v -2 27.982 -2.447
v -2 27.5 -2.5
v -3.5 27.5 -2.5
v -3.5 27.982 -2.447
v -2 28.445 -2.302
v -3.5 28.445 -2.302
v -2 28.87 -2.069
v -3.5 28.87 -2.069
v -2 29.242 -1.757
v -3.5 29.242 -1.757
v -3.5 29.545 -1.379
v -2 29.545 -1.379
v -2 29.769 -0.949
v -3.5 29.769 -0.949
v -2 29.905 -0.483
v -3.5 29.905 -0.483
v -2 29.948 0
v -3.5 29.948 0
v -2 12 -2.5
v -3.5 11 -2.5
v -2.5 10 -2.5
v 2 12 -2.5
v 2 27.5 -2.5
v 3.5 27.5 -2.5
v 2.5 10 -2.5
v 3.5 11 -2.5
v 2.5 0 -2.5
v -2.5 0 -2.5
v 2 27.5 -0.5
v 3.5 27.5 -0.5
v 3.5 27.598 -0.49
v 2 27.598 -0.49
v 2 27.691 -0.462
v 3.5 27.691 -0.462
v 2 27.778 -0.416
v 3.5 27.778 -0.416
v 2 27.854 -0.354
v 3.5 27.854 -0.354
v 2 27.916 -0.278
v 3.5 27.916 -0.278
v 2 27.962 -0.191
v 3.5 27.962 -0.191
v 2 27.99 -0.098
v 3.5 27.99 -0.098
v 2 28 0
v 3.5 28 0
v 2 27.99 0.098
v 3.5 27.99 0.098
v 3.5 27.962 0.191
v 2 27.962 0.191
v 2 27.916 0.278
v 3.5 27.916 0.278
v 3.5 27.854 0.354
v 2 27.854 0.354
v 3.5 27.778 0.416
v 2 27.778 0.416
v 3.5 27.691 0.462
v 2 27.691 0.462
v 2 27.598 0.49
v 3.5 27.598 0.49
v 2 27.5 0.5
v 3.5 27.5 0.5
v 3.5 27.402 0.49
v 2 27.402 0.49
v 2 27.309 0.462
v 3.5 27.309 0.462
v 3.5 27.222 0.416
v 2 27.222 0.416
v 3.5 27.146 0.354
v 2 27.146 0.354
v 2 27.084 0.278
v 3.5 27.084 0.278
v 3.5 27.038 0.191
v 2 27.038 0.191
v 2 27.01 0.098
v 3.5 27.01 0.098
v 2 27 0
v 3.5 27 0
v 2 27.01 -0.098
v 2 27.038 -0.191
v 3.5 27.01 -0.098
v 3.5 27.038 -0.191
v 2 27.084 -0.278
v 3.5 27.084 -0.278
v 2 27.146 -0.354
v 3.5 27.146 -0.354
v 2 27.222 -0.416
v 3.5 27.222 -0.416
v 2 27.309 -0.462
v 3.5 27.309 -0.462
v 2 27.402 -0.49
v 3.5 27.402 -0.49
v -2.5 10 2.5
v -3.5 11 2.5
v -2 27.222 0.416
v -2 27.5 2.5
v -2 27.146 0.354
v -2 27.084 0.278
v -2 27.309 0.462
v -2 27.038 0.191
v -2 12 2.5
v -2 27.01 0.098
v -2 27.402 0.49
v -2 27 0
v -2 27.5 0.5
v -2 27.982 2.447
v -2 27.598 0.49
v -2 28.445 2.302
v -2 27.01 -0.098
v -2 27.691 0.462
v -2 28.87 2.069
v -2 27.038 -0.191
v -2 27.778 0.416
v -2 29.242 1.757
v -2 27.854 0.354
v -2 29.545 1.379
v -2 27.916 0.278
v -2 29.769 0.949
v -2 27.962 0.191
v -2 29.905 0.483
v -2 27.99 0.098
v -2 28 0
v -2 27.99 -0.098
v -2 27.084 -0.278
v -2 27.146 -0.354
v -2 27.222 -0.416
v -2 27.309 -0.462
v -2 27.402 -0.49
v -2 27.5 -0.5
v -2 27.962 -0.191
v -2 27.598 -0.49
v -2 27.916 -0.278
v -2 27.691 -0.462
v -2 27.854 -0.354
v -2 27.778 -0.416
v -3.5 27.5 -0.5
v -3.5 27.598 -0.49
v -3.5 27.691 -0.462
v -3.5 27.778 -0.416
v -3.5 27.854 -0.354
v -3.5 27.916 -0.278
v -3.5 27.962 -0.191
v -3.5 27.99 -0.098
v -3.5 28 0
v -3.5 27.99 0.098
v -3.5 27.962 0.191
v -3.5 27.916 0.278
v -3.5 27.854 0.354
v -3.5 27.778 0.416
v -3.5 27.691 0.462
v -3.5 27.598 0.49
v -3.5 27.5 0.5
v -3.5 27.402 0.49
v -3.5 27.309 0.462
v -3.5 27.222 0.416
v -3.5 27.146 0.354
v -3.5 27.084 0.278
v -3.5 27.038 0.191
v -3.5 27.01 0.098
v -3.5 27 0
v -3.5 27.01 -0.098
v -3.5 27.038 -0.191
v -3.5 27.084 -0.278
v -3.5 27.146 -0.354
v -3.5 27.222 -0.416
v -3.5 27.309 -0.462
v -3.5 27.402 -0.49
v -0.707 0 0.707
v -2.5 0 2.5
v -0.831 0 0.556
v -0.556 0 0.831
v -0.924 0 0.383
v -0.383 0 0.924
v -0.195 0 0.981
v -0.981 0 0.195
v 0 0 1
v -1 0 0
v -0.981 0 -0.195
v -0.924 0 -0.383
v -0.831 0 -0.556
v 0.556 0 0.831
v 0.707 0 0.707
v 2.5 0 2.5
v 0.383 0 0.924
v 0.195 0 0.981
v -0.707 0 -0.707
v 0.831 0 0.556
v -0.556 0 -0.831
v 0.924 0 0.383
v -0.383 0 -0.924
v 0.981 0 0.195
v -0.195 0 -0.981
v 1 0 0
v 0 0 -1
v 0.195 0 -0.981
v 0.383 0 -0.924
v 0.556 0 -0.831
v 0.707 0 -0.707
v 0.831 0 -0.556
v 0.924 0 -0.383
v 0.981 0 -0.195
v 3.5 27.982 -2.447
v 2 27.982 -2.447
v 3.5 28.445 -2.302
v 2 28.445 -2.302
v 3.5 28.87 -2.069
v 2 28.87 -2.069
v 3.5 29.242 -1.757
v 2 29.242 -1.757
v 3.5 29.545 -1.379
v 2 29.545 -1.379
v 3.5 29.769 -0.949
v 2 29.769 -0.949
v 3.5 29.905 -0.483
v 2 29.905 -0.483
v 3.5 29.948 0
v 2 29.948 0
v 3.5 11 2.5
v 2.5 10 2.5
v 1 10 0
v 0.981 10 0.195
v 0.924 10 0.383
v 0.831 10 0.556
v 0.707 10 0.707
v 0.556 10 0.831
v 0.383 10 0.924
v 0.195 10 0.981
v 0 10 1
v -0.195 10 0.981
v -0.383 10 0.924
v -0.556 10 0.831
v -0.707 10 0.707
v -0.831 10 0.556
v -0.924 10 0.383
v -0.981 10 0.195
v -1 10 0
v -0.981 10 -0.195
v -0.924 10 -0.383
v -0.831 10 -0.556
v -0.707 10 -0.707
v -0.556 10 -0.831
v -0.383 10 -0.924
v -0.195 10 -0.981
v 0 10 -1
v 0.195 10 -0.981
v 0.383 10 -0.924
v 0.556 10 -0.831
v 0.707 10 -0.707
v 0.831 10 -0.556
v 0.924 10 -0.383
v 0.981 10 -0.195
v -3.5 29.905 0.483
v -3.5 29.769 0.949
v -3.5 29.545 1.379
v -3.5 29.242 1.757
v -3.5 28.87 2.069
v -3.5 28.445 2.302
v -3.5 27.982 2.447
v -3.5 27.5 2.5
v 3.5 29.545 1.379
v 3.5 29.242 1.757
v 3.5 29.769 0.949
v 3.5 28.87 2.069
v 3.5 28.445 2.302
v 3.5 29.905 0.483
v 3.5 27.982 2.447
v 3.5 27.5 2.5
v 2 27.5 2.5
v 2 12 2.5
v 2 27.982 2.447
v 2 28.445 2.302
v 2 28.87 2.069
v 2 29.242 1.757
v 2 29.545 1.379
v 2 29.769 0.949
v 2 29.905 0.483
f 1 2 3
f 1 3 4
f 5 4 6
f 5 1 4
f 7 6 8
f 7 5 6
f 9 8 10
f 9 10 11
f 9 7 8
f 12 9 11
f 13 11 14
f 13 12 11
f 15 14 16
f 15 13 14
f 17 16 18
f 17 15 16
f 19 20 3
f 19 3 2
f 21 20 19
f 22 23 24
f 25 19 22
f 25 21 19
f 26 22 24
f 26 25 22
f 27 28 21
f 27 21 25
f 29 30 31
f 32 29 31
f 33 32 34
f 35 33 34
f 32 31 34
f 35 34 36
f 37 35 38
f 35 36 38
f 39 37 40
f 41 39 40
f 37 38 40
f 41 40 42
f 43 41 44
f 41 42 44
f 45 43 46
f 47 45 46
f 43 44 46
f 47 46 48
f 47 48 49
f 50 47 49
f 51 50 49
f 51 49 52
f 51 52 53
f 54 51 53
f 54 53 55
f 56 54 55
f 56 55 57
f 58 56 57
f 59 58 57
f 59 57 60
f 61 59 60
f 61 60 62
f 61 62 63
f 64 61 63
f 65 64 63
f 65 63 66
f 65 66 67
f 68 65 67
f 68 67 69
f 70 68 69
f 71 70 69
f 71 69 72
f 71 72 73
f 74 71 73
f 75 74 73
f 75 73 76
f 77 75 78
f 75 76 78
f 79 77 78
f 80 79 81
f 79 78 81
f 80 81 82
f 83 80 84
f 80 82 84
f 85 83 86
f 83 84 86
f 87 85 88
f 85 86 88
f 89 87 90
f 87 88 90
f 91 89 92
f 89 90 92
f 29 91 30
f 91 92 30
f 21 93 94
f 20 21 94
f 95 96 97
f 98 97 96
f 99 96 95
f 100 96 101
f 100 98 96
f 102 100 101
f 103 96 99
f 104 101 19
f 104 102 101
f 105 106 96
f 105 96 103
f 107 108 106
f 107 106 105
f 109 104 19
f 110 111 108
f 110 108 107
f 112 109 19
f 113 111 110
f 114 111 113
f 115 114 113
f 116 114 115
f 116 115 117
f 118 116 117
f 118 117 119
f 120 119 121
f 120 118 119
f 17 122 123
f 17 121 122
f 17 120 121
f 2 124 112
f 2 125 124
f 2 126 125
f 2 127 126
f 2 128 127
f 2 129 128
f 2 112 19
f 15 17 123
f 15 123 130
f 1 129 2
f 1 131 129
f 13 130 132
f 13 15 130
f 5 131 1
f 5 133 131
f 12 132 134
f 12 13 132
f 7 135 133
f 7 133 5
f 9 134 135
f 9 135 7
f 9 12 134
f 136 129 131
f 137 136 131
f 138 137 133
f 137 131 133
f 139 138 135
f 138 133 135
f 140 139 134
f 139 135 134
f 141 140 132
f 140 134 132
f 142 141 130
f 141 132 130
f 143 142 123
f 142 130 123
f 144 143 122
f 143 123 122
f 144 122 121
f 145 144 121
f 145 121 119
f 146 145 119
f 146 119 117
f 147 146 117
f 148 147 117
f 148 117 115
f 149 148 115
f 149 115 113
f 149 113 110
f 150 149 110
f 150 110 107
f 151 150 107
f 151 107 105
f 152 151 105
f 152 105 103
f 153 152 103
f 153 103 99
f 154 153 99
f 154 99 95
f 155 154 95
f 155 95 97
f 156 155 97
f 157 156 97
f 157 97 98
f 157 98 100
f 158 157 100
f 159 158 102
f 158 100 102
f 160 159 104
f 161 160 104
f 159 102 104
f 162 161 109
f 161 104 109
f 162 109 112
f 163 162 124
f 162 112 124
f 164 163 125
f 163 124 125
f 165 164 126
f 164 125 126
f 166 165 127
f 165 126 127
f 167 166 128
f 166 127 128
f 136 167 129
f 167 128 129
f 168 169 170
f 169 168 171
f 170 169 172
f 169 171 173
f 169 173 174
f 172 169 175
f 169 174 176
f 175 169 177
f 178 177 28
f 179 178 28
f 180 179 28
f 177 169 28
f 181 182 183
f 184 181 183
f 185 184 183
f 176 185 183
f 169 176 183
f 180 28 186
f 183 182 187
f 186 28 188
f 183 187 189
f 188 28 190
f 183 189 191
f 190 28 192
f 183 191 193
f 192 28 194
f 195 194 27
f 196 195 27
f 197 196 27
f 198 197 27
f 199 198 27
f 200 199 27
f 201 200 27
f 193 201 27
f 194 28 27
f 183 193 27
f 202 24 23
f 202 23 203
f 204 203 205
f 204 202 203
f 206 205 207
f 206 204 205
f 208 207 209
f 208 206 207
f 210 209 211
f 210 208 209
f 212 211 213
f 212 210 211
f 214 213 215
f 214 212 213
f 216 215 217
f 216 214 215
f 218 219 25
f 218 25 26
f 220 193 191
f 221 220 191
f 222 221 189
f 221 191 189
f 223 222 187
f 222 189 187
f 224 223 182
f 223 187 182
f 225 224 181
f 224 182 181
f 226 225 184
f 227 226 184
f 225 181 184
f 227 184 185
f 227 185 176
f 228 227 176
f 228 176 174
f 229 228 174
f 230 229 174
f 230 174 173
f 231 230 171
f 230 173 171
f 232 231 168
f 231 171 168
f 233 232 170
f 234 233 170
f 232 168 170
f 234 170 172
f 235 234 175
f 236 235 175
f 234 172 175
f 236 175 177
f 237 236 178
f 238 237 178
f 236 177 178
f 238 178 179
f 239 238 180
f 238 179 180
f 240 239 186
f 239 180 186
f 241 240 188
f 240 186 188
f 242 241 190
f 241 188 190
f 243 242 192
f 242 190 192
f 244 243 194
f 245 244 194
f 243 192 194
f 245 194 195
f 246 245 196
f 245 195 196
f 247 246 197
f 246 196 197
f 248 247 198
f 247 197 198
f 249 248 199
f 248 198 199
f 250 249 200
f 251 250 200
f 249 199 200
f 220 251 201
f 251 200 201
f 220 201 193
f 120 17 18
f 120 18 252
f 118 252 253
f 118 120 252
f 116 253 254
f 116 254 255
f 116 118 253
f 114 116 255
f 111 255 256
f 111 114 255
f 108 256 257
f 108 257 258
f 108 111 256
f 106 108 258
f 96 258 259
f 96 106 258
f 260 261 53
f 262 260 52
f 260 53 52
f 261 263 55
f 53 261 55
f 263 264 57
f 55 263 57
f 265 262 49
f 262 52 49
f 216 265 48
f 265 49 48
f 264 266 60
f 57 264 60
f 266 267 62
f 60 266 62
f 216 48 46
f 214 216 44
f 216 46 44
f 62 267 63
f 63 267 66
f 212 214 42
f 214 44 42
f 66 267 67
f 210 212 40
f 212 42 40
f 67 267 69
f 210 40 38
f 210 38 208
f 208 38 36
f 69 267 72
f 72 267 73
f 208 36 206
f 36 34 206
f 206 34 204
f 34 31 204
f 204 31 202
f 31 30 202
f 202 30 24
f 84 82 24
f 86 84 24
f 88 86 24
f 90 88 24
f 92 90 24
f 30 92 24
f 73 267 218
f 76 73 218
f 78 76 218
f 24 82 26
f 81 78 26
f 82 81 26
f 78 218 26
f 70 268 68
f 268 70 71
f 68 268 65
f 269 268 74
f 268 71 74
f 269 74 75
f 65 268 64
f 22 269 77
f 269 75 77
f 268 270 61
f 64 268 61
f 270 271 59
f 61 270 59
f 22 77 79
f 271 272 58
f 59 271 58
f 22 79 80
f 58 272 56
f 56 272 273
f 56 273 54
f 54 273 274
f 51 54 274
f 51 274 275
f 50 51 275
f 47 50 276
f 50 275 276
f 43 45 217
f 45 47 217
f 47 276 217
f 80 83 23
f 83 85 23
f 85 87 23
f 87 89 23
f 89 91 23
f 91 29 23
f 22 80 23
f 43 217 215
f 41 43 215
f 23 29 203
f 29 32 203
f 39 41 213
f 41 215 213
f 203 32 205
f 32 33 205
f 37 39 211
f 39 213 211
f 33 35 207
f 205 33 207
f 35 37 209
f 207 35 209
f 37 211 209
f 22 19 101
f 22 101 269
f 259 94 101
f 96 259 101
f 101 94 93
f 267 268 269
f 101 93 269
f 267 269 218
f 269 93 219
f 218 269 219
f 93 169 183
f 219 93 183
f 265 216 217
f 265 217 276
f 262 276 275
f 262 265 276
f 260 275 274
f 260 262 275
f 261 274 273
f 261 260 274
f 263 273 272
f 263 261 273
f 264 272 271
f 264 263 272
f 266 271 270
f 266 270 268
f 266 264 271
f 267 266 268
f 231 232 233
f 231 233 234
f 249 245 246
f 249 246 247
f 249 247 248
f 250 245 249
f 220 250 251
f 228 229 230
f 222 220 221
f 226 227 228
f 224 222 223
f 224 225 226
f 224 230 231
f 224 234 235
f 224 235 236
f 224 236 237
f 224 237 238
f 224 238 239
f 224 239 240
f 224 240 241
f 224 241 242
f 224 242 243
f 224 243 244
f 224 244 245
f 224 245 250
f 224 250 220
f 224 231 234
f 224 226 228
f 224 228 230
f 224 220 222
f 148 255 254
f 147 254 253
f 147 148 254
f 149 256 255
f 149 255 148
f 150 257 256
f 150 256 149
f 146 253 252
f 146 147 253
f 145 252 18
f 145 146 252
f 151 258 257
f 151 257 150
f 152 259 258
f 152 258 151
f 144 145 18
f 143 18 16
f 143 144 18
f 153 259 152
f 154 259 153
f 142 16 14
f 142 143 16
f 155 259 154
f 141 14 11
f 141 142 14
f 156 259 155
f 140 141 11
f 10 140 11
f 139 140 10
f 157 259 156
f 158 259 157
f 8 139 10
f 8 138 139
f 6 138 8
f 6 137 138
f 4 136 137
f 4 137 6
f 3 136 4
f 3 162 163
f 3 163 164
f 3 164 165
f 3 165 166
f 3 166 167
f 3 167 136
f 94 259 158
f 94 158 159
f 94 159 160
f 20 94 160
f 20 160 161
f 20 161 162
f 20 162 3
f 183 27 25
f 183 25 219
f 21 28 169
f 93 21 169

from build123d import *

# Parameters (mm, degrees)
SKETCH1_W           = 7
SKETCH1_H           = 5
BOSS_EXTRUDE1_DEPTH = 30
SKETCH3_W           = 1
SKETCH3_H           = 5
CUT_EXTRUDE1_DEPTH  = 10
SKETCH4_W           = 4
SKETCH4_H           = 5
CUT_EXTRUDE2_DEPTH  = 18
CUT_EXTRUDE3_REACH  = 7
CUT_EXTRUDE5_DEPTH  = 8
SKETCH8_R           = 0.5
CUT_EXTRUDE6_DEPTH  = 8
SKETCH9_R           = 1
CUT_EXTRUDE7_DEPTH  = 10


with BuildPart() as part:
    # Sketch1 → Boss-Extrude1 (new body)
    with BuildSketch(Plane(origin=(0, 0, 0), x_dir=(1, 0, 0), z_dir=(0, 1, 0))):
        Rectangle(SKETCH1_W, SKETCH1_H)
    extrude(amount=BOSS_EXTRUDE1_DEPTH)

    # Sketch3 → Cut-Extrude1 (cut)
    with BuildSketch(Plane.XZ):
        with Locations((-3, 0)):
            Rectangle(SKETCH3_W, SKETCH3_H)
        with Locations((3, 0)):
            Rectangle(SKETCH3_W, SKETCH3_H)
    extrude(amount=-CUT_EXTRUDE1_DEPTH, mode=Mode.SUBTRACT)

    # Sketch4 → Cut-Extrude2 (cut)
    with BuildSketch(Plane(origin=(0, 30, 0), x_dir=(1, 0, 0), z_dir=(0, 1, 0))):
        Rectangle(SKETCH4_W, SKETCH4_H)
    extrude(amount=-CUT_EXTRUDE2_DEPTH, mode=Mode.SUBTRACT)

    # Sketch5 → Cut-Extrude3 (cut, up to next)
    with BuildSketch(Plane.XY.offset(2.5), mode=Mode.PRIVATE) as cut_extrude3_sk1:
        Polygon((-3.5, 10), (-2.5, 10), (-3.5, 11), align=None)
    cut_extrude3_tool1 = extrude(cut_extrude3_sk1.sketch, amount=-CUT_EXTRUDE3_REACH, mode=Mode.PRIVATE) & part.part
    add(cut_extrude3_tool1.solids().sort_by_distance((-3.166667, 10.333333, 2.5))[0], mode=Mode.SUBTRACT)
    # Sketch5 → Cut-Extrude3 (cut, up to next)
    with BuildSketch(Plane.XY.offset(2.5), mode=Mode.PRIVATE) as cut_extrude3_sk2:
        Polygon((3.5, 11), (3.5, 10), (2.5, 10), align=None)
    cut_extrude3_tool2 = extrude(cut_extrude3_sk2.sketch, amount=-CUT_EXTRUDE3_REACH, mode=Mode.PRIVATE) & part.part
    add(cut_extrude3_tool2.solids().sort_by_distance((3.166667, 10.333333, 2.5))[0], mode=Mode.SUBTRACT)

    # Sketch7 → Cut-Extrude5 (cut, through all)
    with BuildSketch(Plane(origin=(3.5, 0, 0), x_dir=(0, 0, -1), z_dir=(1, 0, 0))):
        with BuildLine():
            Line((-2.5, 27.5), (-2.5, 30))
            Line((-2.5, 30), (2.5, 30))
            Line((2.5, 30), (2.5, 27.5))
            ThreePointArc((2.5, 27.5), (1.756951521, 29.241656191), (0, 29.947778476))
            ThreePointArc((0, 29.947778476), (-1.756951521, 29.241656191), (-2.5, 27.5))
        make_face()
    extrude(amount=-CUT_EXTRUDE5_DEPTH, mode=Mode.SUBTRACT)

    # Sketch8 → Cut-Extrude6 (cut, through all)
    with BuildSketch(Plane(origin=(3.5, 0, 0), x_dir=(0, 0, -1), z_dir=(1, 0, 0))):
        with Locations((0, 27.5)):
            Circle(SKETCH8_R)
    extrude(amount=-CUT_EXTRUDE6_DEPTH, mode=Mode.SUBTRACT)

    # Sketch9 → Cut-Extrude7 (cut)
    with BuildSketch(Plane.XZ):
        Circle(SKETCH9_R)
    extrude(amount=-CUT_EXTRUDE7_DEPTH, mode=Mode.SUBTRACT)


solid = part.part
